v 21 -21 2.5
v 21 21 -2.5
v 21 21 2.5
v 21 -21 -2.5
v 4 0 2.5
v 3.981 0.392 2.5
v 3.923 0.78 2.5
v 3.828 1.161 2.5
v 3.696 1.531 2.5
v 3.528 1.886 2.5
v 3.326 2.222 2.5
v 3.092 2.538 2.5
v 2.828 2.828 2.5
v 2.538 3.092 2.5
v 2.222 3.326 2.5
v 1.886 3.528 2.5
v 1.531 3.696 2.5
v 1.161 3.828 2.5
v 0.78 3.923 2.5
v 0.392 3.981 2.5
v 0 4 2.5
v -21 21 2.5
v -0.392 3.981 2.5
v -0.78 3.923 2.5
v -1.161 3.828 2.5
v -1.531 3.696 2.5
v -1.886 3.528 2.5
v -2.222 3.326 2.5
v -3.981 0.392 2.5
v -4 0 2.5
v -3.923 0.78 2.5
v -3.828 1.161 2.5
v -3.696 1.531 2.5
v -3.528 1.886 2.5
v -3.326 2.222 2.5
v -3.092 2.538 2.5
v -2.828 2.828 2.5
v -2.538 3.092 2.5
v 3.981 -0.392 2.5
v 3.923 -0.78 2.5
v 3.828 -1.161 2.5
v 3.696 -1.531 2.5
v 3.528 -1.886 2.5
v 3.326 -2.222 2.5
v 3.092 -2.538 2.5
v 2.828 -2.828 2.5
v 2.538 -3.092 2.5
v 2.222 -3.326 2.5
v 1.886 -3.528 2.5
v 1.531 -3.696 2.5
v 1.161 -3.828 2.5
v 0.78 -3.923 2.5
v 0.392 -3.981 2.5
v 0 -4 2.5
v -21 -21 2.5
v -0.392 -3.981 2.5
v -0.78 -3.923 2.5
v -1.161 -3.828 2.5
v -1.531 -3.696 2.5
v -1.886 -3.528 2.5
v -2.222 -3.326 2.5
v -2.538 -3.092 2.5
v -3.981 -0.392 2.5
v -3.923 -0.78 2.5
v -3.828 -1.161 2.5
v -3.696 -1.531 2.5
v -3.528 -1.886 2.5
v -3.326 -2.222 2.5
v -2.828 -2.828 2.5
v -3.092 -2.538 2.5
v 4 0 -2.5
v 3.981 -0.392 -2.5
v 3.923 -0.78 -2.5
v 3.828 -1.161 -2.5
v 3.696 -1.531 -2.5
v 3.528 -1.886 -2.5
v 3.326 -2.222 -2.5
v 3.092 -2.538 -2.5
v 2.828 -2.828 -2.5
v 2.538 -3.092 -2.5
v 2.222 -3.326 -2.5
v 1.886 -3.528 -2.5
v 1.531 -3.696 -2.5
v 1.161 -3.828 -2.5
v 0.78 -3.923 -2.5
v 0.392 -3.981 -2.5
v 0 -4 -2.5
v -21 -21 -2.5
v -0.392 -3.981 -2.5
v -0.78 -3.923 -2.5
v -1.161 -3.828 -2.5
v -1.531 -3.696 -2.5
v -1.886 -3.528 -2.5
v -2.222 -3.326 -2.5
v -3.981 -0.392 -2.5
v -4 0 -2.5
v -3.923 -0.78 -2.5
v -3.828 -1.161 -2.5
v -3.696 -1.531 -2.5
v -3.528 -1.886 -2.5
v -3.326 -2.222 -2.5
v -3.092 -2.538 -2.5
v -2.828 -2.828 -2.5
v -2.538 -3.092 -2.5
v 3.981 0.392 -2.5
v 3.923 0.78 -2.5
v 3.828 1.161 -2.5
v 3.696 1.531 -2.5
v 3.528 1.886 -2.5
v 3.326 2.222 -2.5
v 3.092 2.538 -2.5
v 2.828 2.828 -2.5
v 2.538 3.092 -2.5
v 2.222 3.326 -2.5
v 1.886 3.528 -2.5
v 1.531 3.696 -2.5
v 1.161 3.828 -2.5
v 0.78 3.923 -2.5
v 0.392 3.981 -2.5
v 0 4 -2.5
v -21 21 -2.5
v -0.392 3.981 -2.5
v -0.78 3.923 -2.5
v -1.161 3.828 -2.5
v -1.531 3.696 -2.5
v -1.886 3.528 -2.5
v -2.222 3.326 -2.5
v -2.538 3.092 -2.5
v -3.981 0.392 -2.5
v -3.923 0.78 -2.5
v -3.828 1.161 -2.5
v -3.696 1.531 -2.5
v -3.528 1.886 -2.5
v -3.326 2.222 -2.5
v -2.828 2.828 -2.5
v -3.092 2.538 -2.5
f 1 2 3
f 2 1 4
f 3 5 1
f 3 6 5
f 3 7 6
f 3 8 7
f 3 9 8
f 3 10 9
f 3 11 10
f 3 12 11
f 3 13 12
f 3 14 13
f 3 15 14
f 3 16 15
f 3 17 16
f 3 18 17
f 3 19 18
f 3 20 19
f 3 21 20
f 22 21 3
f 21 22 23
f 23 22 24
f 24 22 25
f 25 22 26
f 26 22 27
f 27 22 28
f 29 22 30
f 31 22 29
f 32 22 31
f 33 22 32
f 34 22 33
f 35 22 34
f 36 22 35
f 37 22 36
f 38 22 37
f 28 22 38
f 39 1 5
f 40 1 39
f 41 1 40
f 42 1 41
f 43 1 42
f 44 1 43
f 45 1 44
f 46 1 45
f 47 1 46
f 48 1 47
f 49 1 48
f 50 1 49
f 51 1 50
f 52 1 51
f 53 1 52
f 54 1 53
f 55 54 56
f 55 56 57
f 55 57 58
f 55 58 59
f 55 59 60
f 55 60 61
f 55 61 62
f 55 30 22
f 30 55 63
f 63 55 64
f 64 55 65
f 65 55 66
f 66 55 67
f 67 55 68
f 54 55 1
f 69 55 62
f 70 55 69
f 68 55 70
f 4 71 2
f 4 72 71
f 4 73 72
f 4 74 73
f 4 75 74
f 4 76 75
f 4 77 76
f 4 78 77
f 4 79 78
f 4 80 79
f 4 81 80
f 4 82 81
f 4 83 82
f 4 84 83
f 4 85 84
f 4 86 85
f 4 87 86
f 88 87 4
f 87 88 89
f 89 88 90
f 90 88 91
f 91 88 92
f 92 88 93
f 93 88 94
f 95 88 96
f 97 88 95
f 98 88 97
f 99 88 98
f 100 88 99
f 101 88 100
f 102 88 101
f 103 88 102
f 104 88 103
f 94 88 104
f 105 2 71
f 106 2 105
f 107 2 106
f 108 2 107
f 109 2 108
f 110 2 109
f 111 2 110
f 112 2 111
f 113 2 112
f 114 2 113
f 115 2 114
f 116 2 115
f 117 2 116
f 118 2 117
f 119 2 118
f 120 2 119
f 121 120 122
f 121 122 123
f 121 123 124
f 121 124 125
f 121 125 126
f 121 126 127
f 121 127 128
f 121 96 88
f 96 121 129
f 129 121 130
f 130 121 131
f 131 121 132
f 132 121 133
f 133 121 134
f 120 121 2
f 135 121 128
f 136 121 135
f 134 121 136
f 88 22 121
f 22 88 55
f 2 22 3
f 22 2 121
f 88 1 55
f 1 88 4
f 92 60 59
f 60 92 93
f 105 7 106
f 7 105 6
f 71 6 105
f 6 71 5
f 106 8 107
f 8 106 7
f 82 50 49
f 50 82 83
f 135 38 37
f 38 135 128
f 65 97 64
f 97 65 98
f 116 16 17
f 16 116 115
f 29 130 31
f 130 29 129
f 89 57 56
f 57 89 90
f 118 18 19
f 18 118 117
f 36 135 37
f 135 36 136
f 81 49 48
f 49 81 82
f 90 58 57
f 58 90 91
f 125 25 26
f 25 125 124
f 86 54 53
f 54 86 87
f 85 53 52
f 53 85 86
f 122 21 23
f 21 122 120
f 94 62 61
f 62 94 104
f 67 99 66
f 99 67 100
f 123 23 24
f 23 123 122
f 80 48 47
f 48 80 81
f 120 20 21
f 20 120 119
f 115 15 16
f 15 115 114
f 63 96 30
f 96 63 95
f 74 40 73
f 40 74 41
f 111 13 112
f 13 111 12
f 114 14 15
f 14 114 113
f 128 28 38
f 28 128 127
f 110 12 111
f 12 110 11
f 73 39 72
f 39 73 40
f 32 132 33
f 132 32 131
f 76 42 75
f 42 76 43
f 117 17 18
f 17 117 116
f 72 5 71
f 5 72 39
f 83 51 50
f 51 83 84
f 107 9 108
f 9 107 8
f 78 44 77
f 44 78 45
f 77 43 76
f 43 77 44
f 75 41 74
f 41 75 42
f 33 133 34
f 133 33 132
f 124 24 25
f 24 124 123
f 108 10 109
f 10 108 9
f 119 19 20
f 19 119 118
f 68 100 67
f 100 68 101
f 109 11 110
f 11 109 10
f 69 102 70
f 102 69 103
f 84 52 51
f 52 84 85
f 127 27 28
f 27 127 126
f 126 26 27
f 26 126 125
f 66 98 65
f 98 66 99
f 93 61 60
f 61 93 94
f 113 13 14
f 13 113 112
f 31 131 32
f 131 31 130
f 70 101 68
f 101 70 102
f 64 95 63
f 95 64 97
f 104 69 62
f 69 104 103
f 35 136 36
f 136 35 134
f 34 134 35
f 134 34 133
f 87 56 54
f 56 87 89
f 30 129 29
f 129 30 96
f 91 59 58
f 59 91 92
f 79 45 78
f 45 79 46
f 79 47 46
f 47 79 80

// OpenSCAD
// A single-cell baseplate. Its footprint must match the grid it drops into.

// Grid pitch of the system this part drops into.
grid_pitch = 42;

plate_x = grid_pitch;
plate_y = grid_pitch;
plate_z = 5;
bore_d  = 8;
$fn = 64;

difference() {
    cube([plate_x, plate_y, plate_z], center = true);
    cylinder(h = plate_z + 2, d = bore_d, center = true);
}
